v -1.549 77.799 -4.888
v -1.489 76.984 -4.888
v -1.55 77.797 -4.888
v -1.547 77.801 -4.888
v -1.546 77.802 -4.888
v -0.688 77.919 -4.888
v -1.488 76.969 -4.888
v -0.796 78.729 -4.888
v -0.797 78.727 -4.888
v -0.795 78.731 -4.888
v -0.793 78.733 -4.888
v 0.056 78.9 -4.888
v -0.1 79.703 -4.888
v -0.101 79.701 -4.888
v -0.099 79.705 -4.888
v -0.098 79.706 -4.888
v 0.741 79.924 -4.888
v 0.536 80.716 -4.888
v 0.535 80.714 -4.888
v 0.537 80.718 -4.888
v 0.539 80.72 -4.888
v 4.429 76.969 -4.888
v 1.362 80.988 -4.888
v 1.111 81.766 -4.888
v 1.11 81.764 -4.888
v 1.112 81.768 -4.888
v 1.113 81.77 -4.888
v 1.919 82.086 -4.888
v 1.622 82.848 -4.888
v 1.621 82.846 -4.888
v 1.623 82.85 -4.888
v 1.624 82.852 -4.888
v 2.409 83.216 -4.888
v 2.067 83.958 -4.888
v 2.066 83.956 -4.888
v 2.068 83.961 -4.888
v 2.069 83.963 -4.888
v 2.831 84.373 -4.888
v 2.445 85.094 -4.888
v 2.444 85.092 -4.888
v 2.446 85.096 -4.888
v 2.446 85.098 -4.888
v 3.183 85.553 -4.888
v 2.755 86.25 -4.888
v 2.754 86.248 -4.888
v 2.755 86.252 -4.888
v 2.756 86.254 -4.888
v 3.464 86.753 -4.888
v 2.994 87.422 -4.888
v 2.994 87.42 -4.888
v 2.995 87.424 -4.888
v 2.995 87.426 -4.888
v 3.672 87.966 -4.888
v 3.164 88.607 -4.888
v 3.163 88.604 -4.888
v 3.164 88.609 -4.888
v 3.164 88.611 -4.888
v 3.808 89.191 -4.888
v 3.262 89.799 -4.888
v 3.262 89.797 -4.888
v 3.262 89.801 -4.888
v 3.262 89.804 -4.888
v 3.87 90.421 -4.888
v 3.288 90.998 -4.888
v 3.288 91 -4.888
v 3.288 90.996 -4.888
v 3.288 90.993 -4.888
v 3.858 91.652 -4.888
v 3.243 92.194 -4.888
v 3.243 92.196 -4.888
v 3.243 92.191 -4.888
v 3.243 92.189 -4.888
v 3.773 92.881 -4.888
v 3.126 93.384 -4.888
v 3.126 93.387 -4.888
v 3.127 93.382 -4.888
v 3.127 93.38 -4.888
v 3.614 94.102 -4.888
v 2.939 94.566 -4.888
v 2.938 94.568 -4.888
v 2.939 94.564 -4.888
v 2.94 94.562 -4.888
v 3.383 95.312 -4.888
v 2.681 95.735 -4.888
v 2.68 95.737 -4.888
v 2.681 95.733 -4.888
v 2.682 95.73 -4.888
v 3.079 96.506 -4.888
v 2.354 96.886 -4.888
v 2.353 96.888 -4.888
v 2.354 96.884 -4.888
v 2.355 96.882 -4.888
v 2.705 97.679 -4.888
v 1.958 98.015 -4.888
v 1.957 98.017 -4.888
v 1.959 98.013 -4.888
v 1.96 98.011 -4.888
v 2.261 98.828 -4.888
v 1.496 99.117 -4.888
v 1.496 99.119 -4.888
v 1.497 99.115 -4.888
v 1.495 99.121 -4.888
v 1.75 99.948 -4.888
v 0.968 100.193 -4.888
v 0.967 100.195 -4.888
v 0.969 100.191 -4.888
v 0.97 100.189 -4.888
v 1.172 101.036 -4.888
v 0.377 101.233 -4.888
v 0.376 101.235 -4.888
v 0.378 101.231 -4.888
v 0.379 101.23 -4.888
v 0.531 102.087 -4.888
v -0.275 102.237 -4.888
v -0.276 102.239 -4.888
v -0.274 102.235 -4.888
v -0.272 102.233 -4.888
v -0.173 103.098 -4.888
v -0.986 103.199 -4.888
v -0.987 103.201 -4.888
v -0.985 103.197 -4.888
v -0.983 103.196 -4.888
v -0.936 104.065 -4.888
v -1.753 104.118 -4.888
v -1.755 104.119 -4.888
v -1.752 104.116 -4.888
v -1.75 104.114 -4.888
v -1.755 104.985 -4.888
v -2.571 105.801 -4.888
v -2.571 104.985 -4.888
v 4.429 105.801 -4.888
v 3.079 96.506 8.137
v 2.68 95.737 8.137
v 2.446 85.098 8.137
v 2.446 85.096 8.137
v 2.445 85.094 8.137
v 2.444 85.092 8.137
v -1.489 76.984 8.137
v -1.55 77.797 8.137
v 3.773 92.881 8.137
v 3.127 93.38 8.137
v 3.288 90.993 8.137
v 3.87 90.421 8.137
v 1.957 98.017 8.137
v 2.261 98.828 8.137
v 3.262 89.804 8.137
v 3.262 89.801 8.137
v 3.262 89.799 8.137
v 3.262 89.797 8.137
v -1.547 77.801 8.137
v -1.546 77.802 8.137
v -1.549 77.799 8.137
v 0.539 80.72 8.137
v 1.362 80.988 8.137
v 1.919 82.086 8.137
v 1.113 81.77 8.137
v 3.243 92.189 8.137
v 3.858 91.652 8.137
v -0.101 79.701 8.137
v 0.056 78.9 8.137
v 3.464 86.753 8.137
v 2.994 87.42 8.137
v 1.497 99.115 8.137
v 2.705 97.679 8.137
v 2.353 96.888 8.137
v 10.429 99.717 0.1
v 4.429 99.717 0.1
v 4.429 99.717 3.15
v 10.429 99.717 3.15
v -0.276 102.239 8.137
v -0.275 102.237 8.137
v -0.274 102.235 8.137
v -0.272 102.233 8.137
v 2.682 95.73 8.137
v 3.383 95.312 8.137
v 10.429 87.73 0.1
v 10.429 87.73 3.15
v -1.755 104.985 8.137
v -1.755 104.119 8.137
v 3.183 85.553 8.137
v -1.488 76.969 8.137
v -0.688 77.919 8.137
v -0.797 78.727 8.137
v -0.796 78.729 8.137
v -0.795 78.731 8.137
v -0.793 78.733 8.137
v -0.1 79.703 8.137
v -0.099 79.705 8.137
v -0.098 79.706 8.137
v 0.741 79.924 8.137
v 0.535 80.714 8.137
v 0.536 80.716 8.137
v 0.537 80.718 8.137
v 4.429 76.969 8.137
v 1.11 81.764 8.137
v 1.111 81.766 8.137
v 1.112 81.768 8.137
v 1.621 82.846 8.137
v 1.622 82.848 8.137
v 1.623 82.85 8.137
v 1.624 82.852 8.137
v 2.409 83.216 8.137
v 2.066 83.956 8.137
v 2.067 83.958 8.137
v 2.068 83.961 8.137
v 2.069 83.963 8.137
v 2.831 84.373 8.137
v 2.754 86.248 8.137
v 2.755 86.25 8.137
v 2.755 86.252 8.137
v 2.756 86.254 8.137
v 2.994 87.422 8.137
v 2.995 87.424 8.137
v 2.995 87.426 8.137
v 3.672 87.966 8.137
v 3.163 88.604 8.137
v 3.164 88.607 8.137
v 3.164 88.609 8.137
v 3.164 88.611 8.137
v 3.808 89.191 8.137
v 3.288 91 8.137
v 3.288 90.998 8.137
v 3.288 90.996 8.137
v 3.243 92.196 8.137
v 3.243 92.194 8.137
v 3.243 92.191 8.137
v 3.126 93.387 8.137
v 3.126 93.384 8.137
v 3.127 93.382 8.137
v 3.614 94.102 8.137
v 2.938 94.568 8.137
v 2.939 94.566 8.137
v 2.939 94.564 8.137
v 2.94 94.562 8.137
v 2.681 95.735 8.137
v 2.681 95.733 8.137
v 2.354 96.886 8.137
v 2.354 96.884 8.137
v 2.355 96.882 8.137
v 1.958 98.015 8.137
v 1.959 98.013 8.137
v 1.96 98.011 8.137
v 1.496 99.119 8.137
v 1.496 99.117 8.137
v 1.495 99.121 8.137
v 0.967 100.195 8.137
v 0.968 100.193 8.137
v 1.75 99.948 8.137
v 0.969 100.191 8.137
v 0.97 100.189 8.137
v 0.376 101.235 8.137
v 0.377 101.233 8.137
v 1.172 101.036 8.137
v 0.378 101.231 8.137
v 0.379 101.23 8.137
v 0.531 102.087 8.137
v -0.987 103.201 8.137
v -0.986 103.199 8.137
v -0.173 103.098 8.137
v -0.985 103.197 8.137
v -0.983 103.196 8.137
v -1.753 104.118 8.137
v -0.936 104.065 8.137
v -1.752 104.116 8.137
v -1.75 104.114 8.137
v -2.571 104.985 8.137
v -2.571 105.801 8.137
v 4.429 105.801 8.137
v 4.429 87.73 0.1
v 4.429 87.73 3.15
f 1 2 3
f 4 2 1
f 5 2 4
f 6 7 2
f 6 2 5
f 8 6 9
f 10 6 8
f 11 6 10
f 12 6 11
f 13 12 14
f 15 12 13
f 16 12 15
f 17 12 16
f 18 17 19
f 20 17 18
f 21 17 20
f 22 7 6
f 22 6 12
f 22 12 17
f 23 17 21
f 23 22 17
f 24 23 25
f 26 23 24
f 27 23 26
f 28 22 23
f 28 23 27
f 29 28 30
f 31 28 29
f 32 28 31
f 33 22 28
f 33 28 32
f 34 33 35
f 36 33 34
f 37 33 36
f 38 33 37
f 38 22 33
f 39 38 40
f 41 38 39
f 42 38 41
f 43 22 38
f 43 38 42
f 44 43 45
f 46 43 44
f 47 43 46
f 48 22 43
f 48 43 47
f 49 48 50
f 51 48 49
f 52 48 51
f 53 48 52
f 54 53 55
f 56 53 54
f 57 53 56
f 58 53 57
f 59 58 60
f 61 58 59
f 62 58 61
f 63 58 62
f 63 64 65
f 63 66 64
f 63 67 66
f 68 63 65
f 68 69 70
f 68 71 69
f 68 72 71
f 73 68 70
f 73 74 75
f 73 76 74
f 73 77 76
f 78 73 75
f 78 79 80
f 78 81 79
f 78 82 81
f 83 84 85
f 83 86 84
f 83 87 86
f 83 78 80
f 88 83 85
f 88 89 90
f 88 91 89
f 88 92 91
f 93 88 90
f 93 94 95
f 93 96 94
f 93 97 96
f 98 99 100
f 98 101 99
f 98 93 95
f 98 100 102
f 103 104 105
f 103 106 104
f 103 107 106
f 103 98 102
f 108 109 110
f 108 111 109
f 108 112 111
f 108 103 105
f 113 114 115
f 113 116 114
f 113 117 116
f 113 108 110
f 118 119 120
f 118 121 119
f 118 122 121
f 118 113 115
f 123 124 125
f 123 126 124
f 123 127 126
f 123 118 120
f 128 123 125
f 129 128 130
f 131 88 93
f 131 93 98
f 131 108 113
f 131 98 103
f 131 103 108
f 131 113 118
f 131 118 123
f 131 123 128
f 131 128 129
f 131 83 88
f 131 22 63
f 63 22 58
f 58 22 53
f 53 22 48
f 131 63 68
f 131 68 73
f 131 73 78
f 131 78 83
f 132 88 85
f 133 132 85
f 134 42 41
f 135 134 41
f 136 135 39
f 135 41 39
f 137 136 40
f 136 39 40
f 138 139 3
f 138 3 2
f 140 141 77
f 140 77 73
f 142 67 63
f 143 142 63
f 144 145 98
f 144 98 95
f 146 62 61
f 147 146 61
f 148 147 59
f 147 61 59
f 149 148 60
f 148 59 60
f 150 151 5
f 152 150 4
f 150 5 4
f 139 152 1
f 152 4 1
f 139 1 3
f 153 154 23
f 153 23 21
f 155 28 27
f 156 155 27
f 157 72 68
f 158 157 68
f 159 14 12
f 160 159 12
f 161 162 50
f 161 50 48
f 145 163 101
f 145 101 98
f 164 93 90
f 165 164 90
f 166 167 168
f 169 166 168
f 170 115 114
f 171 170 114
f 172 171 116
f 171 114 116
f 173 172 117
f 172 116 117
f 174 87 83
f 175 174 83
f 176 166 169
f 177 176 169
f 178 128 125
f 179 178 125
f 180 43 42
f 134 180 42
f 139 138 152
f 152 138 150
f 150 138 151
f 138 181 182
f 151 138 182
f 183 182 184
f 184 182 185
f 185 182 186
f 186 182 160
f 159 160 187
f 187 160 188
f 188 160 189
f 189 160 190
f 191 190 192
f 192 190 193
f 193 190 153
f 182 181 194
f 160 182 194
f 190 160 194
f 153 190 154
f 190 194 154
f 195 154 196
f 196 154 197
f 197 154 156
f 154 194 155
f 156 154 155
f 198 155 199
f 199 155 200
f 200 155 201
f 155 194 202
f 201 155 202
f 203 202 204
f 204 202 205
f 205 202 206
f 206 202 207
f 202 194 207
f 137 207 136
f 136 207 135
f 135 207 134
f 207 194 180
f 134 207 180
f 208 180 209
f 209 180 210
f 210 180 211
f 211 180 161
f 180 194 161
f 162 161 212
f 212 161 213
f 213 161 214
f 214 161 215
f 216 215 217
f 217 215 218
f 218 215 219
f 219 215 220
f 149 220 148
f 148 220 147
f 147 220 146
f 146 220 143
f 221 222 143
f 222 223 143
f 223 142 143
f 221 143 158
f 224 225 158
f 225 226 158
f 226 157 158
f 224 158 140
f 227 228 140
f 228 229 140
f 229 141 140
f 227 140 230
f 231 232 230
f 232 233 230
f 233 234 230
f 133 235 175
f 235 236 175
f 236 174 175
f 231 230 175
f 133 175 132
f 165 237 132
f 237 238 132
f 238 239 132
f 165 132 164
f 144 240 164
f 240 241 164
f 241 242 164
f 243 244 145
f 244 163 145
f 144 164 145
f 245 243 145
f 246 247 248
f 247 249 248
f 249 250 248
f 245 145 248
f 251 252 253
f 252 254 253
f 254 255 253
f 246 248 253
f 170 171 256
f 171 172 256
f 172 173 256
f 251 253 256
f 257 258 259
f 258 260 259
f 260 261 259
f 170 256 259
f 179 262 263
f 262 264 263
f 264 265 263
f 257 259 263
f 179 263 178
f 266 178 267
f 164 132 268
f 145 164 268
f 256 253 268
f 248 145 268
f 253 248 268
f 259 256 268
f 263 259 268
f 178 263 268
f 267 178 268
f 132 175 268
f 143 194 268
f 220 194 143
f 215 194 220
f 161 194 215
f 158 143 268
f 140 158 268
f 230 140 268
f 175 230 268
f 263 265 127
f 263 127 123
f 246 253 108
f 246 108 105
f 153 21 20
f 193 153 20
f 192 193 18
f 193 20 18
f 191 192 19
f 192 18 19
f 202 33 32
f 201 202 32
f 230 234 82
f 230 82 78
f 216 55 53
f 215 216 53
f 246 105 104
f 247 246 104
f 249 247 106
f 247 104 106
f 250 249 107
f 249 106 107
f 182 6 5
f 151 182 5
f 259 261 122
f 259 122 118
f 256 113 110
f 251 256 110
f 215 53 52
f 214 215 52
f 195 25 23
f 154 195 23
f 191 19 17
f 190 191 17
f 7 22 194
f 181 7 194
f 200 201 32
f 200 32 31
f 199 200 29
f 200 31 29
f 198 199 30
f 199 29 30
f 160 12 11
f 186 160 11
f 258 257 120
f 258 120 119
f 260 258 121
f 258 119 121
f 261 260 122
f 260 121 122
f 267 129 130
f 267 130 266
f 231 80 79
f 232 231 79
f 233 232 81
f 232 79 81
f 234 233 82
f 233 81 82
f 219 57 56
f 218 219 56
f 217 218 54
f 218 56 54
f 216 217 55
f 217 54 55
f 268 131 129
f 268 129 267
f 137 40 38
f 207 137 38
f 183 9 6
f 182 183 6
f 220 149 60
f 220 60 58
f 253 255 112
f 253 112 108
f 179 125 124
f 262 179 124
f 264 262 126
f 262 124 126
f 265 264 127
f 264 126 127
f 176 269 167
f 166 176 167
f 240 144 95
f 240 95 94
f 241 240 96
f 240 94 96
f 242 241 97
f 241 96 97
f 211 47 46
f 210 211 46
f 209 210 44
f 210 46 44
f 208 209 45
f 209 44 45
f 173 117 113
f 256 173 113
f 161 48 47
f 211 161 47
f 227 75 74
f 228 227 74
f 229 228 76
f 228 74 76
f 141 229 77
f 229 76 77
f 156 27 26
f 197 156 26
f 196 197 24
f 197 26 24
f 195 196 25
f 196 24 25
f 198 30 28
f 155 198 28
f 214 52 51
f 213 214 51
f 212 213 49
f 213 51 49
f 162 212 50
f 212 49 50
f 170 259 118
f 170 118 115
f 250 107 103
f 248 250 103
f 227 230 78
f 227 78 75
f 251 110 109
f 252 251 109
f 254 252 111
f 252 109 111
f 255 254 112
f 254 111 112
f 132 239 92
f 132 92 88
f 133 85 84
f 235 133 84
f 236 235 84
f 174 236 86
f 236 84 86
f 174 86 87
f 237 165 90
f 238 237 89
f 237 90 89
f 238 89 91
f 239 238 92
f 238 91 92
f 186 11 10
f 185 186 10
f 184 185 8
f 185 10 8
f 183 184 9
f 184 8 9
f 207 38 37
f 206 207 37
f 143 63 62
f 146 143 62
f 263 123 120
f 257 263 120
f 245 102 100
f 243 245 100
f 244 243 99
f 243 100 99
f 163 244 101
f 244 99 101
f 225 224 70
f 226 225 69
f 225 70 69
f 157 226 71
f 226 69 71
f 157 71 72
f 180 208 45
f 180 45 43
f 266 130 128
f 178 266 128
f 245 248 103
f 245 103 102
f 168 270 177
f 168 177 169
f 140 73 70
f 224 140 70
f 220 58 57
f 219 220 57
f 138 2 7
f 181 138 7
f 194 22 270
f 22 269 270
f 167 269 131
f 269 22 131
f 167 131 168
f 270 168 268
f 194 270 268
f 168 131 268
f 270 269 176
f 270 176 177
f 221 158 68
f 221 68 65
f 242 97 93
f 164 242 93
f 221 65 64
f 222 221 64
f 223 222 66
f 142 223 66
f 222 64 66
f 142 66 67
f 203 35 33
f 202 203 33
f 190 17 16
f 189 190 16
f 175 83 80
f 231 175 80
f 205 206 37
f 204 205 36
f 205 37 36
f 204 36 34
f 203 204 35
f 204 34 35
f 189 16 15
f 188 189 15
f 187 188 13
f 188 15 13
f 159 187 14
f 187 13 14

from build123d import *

# Parameters (mm, degrees)
SKETCH2_W           = 3.05
SKETCH2_H           = 11.9875
BOSS_EXTRUDE1_DEPTH = 6
SKETCH3_W           = 13.025
SKETCH3_H           = 28.832473971
BOSS_EXTRUDE2_DEPTH = 7
CUT_EXTRUDE1_DEPTH  = 108.108978223
CUT_EXTRUDE2_DEPTH  = 108.108978223
CUT_EXTRUDE5_DEPTH  = 108.108978223


with BuildPart() as part:
    # Sketch2 → Boss-Extrude1 (new body)
    with BuildSketch(Plane.ZY.offset(-4.42928947)):
        with Locations((1.625, 93.723397238)):
            Rectangle(SKETCH2_W, SKETCH2_H)
    extrude(amount=-BOSS_EXTRUDE1_DEPTH)

    # Sketch3 → Boss-Extrude2 (add)
    with BuildSketch(Plane.ZY.offset(-4.42928947)):
        with Locations((1.625, 91.385050871)):
            Rectangle(SKETCH3_W, SKETCH3_H)
    extrude(amount=BOSS_EXTRUDE2_DEPTH)

    # Sketch4 → Cut-Extrude1 (cut, through all)
    with BuildSketch(Plane(origin=(0, 0, -4.8875), x_dir=(-1, 0, 0), z_dir=(0, 0, -1))):
        with BuildLine():
            Line((2.304557749, 76.968813885), (2.57071053, 76.968813885))
            Line((2.57071053, 76.968813885), (2.57071053, 104.985183039))
            ThreePointArc((2.57071053, 104.985183039), (-3.287898054, 91.031390461), (2.304557749, 76.968813885))
        make_face()
    extrude(amount=-CUT_EXTRUDE1_DEPTH, mode=Mode.SUBTRACT)

    # Sketch5 → Cut-Extrude2 (cut, through all)
    with BuildSketch(Plane(origin=(0, 0, -4.8875), x_dir=(-1, 0, 0), z_dir=(0, 0, -1))):
        with BuildLine():
            Line((1.754605713, 104.985183039), (1.754605713, 104.119213356))
            ThreePointArc((1.754605713, 104.119213356), (2.156216431, 104.558268957), (2.57071053, 104.985183039))
            Line((2.57071053, 104.985183039), (1.754605713, 104.985183039))
        make_face()
        with BuildLine():
            Line((1.489258694, 76.983594993), (2.352806951, 76.918880997))
            ThreePointArc((2.352806951, 76.918880997), (1.944991444, 77.352179397), (1.550246284, 77.797417816))
            Line((1.550246284, 77.797417816), (1.489258694, 76.983594993))
        make_face()
        with BuildLine():
            Line((0.687749631, 77.91873396), (1.545882082, 77.802492021))
            ThreePointArc((1.545882082, 77.802492021), (1.164709557, 78.259403935), (0.797298045, 78.727452834))
            Line((0.797298045, 78.727452834), (0.687749631, 77.91873396))
        make_face()
        with BuildLine():
            Line((-0.056399641, 78.900132721), (0.793245114, 78.732778955))
            ThreePointArc((0.793245114, 78.732778955), (0.440080068, 79.211668756), (0.101317444, 79.700852644))
            Line((0.101317444, 79.700852644), (-0.056399641, 78.900132721))
        make_face()
        with BuildLine():
            Line((-0.74052526, 79.924278124), (0.097590291, 79.706411614))
            ThreePointArc((0.097590291, 79.706411614), (-0.226303036, 80.205565001), (-0.53520409, 80.714132724))
            Line((-0.53520409, 80.714132724), (-0.74052526, 79.924278124))
        make_face()
        with BuildLine():
            Line((-1.362178233, 80.987503993), (-0.538592123, 80.719904644))
            ThreePointArc((-0.538592123, 80.719904644), (-0.832054276, 81.237534778), (-1.109987975, 81.763665797))
            Line((-1.109987975, 81.763665797), (-1.362178233, 80.987503993))
        make_face()
        with BuildLine():
            Line((-1.919133205, 82.086004256), (-1.113024759, 81.769630004))
            ThreePointArc((-1.113024759, 81.769630004), (-1.375005221, 82.303883903), (-1.620976635, 82.845694806))
            Line((-1.620976635, 82.845694806), (-1.919133205, 82.086004256))
        make_face()
        with BuildLine():
            Line((-2.40939642, 83.215846566), (-1.623651299, 82.85182995))
            ThreePointArc((-1.623651299, 82.85182995), (-1.853212247, 83.400795124), (-2.066340861, 83.956346368))
            Line((-2.066340861, 83.956346368), (-2.40939642, 83.215846566))
        make_face()
        with BuildLine():
            Line((-2.831212865, 84.372986382), (-2.068643831, 83.962630487))
            ThreePointArc((-2.068643831, 83.962630487), (-2.264963498, 84.524341782), (-2.444486366, 85.091644638))
            Line((-2.444486366, 85.091644638), (-2.831212865, 84.372986382))
        make_face()
        with BuildLine():
            Line((-3.183072545, 85.553281444), (-2.446409398, 85.098055237))
            ThreePointArc((-2.446409398, 85.098055237), (-2.608785009, 85.670501873), (-2.754059488, 86.247525544))
            Line((-2.754059488, 86.247525544), (-3.183072545, 85.553281444))
        make_face()
        with BuildLine():
            Line((-3.463715894, 86.752506602), (-2.755595697, 86.254039674))
            ThreePointArc((-2.755595697, 86.254039674), (-2.88344599, 86.835172441), (-2.993952034, 87.419851331))
            Line((-2.993952034, 87.419851331), (-3.463715894, 86.752506602))
        make_face()
        with BuildLine():
            Line((-3.672138283, 87.96636894), (-2.995095921, 87.426445673))
            ThreePointArc((-2.995095921, 87.426445673), (-3.087963225, 88.014184267), (-3.163305252, 88.604425379))
            Line((-3.163305252, 88.604425379), (-3.672138283, 87.96636894))
        make_face()
        with BuildLine():
            Line((-3.807593612, 89.190523146), (-3.164052722, 88.611076327))
            ThreePointArc((-3.164052722, 88.611076327), (-3.221604597, 89.203316795), (-3.2615129, 89.797007218))
            Line((-3.2615129, 89.797007218), (-3.807593612, 89.190523146))
        make_face()
        with BuildLine():
            Line((-3.869596987, 90.420587067), (-3.261861279, 89.803690964))
            ThreePointArc((-3.261861279, 89.803690964), (-3.283891703, 90.39831324), (-3.288223422, 90.993327716))
            Line((-3.288223422, 90.993327716), (-3.869596987, 90.420587067))
        make_face()
        with BuildLine():
            Line((-3.857926452, 91.652157392), (-3.288171462, 91.000020333))
            ThreePointArc((-3.288171462, 91.000020333), (-3.274601572, 91.594895823), (-3.243341201, 92.189104356))
            Line((-3.243341201, 92.189104356), (-3.857926452, 91.652157392))
        make_face()
        with BuildLine():
            Line((-3.772623784, 92.88082542), (-3.242889087, 92.195781886))
            ThreePointArc((-3.242889087, 92.195781886), (-3.19376746, 92.788781091), (-3.127026902, 93.380056567))
            Line((-3.127026902, 93.380056567), (-3.772623784, 92.88082542))
        make_face()
        with BuildLine():
            Line((-3.613994345, 94.102192837), (-3.126176253, 93.386695107))
            ThreePointArc((-3.126176253, 93.386695107), (-3.041678732, 93.975695243), (-2.939696901, 94.56192105))
            Line((-2.939696901, 94.56192105), (-3.613994345, 94.102192837))
        make_face()
        with BuildLine():
            Line((-3.382605988, 95.311887466), (-2.938450763, 94.568496836))
            ThreePointArc((-2.938450763, 94.568496836), (-2.818879826, 95.151389435), (-2.682021792, 95.730467037))
            Line((-2.682021792, 95.730467037), (-3.382605988, 95.311887466))
        make_face()
        with BuildLine():
            Line((-3.079287021, 96.505578914), (-2.680384624, 95.736956529))
            ThreePointArc((-2.680384624, 95.736956529), (-2.526168306, 96.311654987), (-2.354923983, 96.881511437))
            Line((-2.354923983, 96.881511437), (-3.079287021, 96.505578914))
        make_face()
        with BuildLine():
            Line((-2.705123249, 97.678994074), (-2.352901647, 96.887891404))
            ThreePointArc((-2.352901647, 96.887891404), (-2.164592001, 97.45233845), (-1.959574401, 98.010933808))
            Line((-1.959574401, 98.010933808), (-2.705123249, 97.678994074))
        make_face()
        with BuildLine():
            Line((-2.261454081, 98.827932426), (-1.957174136, 98.017181412))
            ThreePointArc((-1.957174136, 98.017181412), (-1.735445261, 98.569356472), (-1.497388293, 99.114691113))
            Line((-1.497388293, 99.114691113), (-2.261454081, 98.827932426))
        make_face()
        with BuildLine():
            Line((-1.749867737, 99.948281069), (-1.494618692, 99.120783989))
            ThreePointArc((-1.494618692, 99.120783989), (-1.240264321, 99.658710419), (-0.970020167, 100.188832186))
            Line((-0.970020167, 100.188832186), (-1.749867737, 99.948281069))
        make_face()
        with BuildLine():
            Line((-1.172195564, 101.036029444), (-0.966891144, 100.194748523))
            ThreePointArc((-0.966891144, 100.194748523), (-0.680821799, 100.716500687), (-0.379357863, 101.229511882))
            Line((-0.379357863, 101.229511882), (-1.172195564, 101.036029444))
        make_face()
        with BuildLine():
            Line((-0.530505477, 102.087283695), (-0.375880619, 101.2352305))
            ThreePointArc((-0.375880619, 101.2352305), (-0.059120355, 101.738940661), (0.2724842, 102.233004837))
            Line((0.2724842, 102.233004837), (-0.530505477, 102.087283695))
        make_face()
        with BuildLine():
            Line((0.172905439, 103.098280604), (0.276297217, 102.238505266))
            ThreePointArc((0.276297217, 102.238505266), (0.622614482, 102.722370271), (0.983172598, 103.195718806))
            Line((0.983172598, 103.195718806), (0.172905439, 103.098280604))
        make_face()
        with BuildLine():
            Line((0.935519155, 104.065401066), (0.987307739, 103.200981356))
            ThreePointArc((0.987307739, 103.200981356), (1.361942278, 103.663269094), (1.75016325, 104.114207524))
            Line((1.75016325, 104.114207524), (0.935519155, 104.065401066))
        make_face()
    extrude(amount=-CUT_EXTRUDE2_DEPTH, mode=Mode.SUBTRACT)

    # Sketch6 → Cut-Extrude5 (cut, through all)
    with BuildSketch(Plane(origin=(0, 0, -4.8875), x_dir=(-1, 0, 0), z_dir=(0, 0, -1))):
        Polygon((1.489258694, 76.983594993), (1.488151003, 76.968813885), (1.686498876, 76.968813885), align=None)
    extrude(amount=-CUT_EXTRUDE5_DEPTH, mode=Mode.SUBTRACT)


solid = part.part
